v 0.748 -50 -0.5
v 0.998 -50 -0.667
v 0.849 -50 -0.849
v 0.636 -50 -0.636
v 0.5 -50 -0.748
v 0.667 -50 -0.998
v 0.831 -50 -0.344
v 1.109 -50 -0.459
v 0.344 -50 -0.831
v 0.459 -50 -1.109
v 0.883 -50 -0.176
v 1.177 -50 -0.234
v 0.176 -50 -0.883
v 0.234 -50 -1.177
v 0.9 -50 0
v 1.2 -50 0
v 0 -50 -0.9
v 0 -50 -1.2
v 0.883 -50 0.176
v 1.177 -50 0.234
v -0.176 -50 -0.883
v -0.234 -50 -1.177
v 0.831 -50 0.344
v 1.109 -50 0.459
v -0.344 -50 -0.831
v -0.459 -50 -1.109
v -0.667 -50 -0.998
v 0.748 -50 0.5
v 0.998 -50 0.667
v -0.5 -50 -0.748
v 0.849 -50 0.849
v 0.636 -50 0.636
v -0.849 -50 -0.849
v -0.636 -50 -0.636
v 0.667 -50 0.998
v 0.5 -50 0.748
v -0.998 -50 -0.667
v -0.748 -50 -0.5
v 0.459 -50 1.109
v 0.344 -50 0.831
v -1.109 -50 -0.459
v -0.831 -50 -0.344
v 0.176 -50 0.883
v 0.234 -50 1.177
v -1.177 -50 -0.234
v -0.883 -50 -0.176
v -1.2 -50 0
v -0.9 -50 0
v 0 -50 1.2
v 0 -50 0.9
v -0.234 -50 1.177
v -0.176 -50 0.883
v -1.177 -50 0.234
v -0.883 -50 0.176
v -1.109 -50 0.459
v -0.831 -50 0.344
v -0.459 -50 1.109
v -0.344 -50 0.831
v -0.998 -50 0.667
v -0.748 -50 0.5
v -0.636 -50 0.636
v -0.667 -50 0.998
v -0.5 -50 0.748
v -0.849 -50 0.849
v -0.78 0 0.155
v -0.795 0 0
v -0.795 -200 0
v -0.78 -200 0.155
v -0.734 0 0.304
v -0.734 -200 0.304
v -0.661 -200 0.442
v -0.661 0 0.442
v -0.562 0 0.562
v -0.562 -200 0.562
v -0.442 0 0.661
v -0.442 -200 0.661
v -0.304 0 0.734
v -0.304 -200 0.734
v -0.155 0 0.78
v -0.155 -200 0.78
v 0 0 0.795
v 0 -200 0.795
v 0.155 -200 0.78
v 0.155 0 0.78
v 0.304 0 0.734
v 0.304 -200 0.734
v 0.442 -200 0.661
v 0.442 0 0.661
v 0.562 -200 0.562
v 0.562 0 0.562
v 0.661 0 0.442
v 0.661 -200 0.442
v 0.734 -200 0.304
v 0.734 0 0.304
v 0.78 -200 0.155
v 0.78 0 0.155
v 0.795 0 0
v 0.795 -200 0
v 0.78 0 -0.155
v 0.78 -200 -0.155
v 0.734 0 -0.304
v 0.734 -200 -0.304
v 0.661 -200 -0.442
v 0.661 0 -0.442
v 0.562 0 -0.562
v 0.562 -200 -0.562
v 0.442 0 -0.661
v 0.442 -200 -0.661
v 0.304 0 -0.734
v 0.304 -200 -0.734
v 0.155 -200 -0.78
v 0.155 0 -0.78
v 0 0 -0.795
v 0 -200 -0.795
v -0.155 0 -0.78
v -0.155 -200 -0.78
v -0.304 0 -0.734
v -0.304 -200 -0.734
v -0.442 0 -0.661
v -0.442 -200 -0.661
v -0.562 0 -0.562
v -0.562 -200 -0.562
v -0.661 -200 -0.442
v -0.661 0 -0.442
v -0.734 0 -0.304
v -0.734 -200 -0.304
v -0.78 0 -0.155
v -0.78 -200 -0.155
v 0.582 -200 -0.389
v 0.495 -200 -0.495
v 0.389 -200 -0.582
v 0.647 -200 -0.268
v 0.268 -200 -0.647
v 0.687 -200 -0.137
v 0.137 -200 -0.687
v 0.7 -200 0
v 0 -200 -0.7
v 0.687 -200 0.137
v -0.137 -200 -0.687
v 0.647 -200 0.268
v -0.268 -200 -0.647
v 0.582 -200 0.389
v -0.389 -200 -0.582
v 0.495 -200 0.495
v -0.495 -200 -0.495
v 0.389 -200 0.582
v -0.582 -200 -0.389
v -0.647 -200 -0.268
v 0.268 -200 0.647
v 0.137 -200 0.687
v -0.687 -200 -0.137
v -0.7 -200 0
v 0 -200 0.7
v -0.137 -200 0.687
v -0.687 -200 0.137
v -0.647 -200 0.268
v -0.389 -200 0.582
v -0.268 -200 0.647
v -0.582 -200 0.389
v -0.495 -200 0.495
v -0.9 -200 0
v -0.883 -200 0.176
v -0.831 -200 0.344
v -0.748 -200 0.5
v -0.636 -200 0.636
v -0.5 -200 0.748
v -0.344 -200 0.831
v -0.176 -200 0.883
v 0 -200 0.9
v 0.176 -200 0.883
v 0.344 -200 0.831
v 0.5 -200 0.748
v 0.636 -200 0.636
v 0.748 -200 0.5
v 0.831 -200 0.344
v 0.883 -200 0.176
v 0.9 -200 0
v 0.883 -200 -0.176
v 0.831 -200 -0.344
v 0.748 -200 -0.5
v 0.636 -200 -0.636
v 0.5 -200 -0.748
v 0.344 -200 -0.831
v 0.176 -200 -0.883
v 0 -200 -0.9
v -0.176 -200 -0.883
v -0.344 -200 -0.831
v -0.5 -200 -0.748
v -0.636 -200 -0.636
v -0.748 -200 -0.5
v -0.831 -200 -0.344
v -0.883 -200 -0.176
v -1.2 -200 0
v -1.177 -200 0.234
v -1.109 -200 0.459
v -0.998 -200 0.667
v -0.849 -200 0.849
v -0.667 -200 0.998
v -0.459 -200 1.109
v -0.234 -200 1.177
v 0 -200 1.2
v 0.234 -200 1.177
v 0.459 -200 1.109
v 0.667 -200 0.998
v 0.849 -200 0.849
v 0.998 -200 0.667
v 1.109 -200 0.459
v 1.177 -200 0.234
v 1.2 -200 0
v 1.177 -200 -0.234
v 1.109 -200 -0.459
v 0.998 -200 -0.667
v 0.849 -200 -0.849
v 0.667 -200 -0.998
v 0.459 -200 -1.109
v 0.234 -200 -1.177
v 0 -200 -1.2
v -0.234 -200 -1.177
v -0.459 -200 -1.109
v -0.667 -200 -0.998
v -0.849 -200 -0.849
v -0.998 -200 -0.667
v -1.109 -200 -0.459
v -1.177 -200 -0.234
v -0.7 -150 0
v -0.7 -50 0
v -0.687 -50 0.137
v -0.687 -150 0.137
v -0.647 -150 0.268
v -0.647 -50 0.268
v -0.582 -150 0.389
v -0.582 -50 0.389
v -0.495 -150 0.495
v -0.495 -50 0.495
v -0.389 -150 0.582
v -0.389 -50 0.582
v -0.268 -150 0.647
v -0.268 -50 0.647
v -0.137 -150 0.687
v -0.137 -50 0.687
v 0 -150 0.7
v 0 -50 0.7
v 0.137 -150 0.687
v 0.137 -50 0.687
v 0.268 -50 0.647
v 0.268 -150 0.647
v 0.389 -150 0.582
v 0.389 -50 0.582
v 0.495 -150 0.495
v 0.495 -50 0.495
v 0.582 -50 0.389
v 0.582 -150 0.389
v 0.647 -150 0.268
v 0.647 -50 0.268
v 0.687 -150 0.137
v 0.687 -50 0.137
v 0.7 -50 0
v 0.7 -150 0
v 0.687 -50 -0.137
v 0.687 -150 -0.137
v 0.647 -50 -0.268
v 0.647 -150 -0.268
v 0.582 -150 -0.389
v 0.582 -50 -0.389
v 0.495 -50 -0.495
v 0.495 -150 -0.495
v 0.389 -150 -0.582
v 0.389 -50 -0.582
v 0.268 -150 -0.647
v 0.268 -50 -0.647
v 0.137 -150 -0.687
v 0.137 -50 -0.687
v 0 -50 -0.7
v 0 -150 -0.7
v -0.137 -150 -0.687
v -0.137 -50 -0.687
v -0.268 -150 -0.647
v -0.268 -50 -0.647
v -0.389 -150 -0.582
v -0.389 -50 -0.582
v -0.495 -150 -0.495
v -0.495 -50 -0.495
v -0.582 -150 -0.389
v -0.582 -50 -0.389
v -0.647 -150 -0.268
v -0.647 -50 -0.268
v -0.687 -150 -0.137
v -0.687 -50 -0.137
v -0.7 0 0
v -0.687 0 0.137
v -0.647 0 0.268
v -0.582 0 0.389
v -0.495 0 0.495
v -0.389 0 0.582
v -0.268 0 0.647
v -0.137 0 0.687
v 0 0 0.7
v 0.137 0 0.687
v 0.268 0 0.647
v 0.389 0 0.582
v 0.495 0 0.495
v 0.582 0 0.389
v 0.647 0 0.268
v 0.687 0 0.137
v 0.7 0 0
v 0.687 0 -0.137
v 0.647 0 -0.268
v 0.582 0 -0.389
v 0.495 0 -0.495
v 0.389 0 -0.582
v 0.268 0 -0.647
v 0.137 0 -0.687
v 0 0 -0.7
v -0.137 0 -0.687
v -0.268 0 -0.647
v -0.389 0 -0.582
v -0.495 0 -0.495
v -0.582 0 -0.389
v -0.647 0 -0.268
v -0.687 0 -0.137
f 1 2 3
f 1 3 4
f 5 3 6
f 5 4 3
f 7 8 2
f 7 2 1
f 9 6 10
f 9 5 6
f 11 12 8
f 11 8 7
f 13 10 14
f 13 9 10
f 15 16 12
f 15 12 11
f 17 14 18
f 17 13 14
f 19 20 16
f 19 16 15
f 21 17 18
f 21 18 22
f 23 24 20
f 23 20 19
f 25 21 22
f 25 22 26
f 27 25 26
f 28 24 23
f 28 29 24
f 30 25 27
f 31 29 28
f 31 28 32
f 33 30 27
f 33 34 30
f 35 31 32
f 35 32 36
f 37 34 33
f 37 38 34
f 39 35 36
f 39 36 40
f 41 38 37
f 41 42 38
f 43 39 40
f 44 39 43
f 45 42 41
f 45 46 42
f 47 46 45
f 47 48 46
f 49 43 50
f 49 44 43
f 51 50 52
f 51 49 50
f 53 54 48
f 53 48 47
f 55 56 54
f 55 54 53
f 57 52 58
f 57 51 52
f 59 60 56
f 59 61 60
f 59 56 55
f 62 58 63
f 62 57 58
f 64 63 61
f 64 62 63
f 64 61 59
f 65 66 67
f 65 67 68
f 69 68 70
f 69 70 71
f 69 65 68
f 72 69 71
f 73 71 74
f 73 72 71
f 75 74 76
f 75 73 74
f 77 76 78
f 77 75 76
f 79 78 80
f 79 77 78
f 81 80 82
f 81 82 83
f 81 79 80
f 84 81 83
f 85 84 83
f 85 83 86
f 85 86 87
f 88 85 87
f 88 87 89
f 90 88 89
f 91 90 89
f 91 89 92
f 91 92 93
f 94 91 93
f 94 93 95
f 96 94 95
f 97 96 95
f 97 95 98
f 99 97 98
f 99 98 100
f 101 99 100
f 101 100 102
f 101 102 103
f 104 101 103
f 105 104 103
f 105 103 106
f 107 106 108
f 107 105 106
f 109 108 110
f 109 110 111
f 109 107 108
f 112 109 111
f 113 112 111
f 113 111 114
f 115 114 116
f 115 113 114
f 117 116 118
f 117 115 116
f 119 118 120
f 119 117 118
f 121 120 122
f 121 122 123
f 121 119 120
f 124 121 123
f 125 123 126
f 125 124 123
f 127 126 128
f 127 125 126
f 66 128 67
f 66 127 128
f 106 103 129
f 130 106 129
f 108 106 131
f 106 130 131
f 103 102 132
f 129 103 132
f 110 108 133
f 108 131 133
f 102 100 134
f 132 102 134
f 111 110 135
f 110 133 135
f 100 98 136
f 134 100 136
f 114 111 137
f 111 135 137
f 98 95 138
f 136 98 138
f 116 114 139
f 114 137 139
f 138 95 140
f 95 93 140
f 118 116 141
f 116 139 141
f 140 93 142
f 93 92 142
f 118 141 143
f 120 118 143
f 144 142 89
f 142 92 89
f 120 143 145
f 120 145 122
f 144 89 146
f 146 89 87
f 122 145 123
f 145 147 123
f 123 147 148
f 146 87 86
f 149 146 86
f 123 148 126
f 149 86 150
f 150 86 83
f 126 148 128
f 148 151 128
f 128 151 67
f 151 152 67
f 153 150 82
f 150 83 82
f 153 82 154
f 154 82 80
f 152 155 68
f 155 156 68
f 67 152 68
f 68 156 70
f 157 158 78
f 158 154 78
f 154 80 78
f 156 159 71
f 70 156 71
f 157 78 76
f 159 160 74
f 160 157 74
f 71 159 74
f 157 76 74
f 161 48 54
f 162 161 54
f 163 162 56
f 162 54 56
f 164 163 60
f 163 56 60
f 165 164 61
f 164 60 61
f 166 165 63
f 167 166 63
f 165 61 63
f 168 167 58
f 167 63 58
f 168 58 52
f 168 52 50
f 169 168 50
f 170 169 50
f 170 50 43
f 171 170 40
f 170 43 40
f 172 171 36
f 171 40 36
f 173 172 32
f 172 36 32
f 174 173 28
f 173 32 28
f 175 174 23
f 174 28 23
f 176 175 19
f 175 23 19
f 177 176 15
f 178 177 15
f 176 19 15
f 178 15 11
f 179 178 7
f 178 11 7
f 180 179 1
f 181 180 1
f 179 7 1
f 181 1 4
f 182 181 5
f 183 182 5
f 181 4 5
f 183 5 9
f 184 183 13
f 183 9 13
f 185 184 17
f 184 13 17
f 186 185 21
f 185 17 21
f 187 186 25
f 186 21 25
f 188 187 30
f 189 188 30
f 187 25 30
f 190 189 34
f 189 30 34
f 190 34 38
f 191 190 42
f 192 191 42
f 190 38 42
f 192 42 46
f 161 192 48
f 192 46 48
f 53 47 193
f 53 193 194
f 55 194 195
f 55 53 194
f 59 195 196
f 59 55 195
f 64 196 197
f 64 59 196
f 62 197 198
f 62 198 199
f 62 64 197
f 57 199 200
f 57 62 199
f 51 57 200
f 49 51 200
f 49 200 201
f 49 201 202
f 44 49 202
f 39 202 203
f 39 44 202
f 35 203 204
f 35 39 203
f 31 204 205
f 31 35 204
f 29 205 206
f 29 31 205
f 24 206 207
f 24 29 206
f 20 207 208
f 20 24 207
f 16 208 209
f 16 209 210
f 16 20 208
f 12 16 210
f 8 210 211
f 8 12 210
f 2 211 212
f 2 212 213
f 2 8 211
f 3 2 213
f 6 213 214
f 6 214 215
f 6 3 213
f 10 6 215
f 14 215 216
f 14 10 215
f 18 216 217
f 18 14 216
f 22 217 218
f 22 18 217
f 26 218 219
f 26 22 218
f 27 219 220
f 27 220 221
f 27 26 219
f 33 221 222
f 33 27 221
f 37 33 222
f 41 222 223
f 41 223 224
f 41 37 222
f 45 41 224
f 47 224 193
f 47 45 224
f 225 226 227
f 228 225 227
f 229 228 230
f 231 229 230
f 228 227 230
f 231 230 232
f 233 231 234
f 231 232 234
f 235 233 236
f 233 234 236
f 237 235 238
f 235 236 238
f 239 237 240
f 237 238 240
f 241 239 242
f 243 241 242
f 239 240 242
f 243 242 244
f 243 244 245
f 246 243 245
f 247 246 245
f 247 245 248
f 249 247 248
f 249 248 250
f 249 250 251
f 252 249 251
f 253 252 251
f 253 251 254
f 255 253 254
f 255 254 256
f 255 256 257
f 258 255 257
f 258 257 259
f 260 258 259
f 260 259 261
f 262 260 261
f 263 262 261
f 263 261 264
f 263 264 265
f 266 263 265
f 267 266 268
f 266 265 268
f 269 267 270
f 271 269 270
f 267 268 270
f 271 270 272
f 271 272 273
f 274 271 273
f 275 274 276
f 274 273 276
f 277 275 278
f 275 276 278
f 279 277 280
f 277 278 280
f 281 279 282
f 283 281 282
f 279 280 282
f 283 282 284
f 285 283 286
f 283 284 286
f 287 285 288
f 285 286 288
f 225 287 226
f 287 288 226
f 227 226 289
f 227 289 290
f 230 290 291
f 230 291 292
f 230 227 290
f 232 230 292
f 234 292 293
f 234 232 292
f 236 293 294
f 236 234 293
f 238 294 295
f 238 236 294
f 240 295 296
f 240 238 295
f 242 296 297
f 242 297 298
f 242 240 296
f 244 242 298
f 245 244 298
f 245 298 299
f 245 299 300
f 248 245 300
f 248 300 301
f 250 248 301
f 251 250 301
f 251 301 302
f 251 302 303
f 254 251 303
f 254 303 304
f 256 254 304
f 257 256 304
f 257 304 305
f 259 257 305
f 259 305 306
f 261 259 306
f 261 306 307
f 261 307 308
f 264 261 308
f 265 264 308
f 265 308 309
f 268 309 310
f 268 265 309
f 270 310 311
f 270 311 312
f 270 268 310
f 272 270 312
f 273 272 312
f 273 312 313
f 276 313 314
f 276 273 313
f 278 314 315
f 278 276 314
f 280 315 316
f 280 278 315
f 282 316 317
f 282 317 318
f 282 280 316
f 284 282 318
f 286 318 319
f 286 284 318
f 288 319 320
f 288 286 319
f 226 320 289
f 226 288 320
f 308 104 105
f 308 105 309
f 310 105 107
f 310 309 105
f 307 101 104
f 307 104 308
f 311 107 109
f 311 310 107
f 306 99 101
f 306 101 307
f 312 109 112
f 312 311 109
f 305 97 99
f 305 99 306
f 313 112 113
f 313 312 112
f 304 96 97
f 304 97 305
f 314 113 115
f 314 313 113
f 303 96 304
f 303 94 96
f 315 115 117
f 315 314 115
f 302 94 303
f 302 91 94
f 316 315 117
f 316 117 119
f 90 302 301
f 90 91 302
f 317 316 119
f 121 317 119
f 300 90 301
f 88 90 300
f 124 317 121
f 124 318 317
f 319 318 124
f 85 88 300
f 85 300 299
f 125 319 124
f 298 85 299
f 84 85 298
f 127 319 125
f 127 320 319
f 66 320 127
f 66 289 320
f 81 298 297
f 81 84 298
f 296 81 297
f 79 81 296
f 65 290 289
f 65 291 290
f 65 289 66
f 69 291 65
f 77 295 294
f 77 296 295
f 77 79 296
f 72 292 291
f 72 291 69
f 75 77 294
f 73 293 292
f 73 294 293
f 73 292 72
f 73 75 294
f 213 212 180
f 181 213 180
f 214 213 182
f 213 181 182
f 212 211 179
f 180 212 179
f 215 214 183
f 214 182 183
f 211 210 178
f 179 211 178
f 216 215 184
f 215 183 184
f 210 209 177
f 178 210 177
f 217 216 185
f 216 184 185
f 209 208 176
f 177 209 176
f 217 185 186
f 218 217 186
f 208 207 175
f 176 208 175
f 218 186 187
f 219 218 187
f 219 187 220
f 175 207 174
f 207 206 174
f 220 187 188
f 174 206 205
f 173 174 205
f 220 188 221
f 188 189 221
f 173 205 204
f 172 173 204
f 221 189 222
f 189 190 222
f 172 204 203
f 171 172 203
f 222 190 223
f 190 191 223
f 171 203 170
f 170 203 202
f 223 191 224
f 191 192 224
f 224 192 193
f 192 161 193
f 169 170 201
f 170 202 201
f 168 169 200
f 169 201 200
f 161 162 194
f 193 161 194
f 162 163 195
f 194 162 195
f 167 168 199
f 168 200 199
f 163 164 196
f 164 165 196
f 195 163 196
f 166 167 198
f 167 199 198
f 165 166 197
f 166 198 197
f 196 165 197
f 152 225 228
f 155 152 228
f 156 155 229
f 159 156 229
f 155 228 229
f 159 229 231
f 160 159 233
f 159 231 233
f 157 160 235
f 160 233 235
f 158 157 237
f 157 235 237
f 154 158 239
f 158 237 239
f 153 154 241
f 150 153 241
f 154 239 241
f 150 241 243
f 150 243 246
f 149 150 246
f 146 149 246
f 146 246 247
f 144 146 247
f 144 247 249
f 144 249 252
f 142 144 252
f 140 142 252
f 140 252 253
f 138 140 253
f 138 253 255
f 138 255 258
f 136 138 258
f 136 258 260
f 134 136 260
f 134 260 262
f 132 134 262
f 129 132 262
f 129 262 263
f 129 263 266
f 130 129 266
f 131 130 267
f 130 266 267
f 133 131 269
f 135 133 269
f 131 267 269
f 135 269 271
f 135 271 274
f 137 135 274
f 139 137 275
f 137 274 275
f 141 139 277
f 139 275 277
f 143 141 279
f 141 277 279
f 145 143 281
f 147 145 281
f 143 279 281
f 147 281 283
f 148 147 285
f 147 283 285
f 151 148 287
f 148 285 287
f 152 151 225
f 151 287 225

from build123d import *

# Parameters (mm, degrees)
F6_R     = 0.795
F6_R_2   = 0.7
F7_DEPTH = 150
F6_R_3   = 1.2
F6_R_4   = 0.9


# Not quite as in the source:
# - a feature of the source that left no trace in its solid (it failed there, or was rolled back) is left out
# - a pattern or mirror of a feature is missing from the dataset's text; its kind, count and spacing are read off the source's solid
# - a feature names something its author has since deleted; it is built from what else it names


with BuildPart() as f7:
    # F6 (on face) → F7 (new body)
    with BuildSketch(Plane(origin=(0, -50, 0), x_dir=(-1, 0, 0), z_dir=(0, 1, 0))):
        Circle(F6_R)
        Circle(F6_R_2, mode=Mode.SUBTRACT)
    extrude(amount=-F7_DEPTH)

    # F7_copies: F7 across plane


with BuildPart() as f7b:
    # F6 (on face) → F7, piece 2 (new body)
    with BuildSketch(Plane(origin=(0, -50, 0), x_dir=(-1, 0, 0), z_dir=(0, 1, 0))):
        Circle(F6_R_3)
        Circle(F6_R_4, mode=Mode.SUBTRACT)
    extrude(amount=-F7_DEPTH)


with BuildPart() as f7_1:
    add(f7.part)
    add(f7.part.mirror(Plane.ZX.offset(-100)))


with BuildPart() as f7b_1:
    # F10: moved
    add(f7b.part)


solid = Compound([f7_1.part, f7b_1.part])
